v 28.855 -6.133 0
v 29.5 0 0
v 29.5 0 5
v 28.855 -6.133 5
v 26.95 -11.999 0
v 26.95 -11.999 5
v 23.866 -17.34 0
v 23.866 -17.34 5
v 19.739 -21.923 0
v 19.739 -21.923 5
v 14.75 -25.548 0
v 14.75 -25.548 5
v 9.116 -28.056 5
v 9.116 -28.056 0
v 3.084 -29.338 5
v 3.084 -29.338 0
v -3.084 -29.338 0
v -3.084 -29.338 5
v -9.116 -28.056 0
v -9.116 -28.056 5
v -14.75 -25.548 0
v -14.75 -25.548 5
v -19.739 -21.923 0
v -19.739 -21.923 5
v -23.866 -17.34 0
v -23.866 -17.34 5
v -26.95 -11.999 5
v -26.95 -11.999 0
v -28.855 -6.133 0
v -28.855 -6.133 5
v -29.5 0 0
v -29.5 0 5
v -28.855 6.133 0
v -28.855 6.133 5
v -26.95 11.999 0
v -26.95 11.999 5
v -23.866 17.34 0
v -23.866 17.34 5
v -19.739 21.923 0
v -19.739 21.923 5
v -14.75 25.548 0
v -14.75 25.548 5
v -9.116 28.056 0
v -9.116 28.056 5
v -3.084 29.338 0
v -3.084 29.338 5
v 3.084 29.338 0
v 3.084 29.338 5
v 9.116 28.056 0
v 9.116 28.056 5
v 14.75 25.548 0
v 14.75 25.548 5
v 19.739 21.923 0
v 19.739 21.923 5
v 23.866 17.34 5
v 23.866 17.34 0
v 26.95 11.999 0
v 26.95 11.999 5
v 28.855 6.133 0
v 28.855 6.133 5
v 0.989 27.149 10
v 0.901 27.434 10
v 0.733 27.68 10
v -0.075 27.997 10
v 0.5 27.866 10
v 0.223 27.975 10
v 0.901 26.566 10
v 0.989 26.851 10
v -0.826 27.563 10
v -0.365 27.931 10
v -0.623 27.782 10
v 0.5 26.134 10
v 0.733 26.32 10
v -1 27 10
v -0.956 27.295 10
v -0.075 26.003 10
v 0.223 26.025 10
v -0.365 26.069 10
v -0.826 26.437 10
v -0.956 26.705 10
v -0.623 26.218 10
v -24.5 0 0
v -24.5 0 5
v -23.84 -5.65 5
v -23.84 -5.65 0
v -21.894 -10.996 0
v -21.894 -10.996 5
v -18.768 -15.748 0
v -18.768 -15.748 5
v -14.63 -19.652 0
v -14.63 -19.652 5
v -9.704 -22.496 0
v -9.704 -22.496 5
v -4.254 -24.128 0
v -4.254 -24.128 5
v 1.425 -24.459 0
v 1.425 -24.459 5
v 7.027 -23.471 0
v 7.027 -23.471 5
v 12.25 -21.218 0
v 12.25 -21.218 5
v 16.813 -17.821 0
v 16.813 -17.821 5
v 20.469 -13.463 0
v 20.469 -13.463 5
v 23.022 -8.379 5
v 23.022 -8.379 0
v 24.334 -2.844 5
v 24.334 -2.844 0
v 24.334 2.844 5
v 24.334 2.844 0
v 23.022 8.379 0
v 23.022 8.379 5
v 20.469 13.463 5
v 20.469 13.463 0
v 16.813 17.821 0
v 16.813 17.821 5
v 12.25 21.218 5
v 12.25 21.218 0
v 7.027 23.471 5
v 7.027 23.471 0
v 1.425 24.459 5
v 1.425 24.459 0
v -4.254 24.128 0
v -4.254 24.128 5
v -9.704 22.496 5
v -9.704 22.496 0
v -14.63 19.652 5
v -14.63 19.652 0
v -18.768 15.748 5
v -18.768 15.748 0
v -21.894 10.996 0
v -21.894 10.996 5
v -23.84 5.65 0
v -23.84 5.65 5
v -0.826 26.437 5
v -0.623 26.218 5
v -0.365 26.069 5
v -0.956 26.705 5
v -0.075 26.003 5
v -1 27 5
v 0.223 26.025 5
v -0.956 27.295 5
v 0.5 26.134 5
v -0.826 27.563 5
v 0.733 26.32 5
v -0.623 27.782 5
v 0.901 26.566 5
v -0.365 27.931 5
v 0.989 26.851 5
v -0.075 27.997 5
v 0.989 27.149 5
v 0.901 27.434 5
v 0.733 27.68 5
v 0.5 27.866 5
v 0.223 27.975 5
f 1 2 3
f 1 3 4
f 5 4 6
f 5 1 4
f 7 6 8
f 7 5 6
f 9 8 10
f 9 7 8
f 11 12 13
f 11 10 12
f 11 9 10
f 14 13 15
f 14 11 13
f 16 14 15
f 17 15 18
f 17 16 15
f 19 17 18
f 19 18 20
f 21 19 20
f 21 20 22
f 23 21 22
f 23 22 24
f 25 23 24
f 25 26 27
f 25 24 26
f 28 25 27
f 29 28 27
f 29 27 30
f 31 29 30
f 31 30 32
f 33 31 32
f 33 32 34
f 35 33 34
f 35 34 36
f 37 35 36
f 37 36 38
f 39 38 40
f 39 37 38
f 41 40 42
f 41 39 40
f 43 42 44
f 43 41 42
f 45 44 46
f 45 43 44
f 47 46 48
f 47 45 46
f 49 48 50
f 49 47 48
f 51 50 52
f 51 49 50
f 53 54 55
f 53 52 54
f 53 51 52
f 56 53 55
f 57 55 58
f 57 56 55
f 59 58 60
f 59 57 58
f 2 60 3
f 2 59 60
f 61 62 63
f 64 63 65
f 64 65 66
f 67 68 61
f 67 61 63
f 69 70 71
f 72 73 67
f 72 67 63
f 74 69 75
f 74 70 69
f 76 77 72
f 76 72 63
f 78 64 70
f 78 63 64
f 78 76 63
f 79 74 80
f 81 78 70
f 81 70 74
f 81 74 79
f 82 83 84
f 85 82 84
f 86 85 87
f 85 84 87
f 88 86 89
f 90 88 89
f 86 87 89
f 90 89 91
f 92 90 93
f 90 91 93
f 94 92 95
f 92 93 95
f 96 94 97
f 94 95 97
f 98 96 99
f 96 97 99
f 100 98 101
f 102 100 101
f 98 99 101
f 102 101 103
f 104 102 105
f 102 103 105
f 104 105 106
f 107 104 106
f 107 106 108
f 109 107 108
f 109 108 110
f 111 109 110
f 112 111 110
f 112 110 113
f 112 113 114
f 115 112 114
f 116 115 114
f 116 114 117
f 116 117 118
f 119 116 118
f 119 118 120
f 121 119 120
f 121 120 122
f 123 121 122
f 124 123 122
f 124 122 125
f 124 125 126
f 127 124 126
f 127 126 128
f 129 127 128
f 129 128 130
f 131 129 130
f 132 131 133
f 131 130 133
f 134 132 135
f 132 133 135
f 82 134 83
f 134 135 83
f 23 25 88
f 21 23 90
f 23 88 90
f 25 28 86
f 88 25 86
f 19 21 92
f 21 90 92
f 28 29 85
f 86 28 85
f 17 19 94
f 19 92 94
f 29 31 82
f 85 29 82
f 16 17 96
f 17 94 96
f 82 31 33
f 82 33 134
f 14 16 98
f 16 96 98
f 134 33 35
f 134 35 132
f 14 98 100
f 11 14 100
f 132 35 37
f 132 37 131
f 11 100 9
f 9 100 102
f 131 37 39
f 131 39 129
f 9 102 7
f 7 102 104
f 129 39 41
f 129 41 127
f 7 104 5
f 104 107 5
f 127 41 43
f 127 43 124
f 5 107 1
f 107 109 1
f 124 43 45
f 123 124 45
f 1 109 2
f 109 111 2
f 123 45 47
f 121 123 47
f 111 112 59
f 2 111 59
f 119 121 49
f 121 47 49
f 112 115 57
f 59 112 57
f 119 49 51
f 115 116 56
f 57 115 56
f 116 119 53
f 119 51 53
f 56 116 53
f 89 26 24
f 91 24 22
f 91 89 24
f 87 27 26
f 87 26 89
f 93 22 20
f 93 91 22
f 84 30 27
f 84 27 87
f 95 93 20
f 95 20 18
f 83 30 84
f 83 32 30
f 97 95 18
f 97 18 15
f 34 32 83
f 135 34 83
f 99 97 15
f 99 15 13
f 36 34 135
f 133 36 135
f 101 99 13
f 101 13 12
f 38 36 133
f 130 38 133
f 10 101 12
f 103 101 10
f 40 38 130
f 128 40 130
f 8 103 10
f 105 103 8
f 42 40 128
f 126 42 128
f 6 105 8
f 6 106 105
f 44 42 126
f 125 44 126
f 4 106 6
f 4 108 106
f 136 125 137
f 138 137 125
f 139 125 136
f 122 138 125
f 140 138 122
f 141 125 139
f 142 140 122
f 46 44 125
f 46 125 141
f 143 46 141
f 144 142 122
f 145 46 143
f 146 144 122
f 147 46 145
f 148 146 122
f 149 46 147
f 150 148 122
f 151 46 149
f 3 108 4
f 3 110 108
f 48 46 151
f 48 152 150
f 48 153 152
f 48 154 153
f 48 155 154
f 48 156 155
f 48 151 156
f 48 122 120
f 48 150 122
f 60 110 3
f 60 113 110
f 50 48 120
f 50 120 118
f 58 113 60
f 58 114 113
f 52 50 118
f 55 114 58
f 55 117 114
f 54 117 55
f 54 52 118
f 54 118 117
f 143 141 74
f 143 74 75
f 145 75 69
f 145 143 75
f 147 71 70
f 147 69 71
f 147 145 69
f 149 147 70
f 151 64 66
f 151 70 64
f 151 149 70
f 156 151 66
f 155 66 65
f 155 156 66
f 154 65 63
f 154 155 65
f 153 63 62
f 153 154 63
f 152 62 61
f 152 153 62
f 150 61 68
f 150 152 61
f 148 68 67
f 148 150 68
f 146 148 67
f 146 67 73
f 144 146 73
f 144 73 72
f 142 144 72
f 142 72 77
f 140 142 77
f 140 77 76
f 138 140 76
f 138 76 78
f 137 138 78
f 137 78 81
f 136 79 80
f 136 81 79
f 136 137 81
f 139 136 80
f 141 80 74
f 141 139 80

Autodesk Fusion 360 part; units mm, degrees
sketch "Sketch1" plane through (0, 0, 0) normal (0, 0, 1) x (1, 0, 0)
  circle A0 centre (0, 0) radius 29.5
  dimension "d1" = 59
sketch "Sketch2" plane through (0, 0, 0) normal (0, 0, 1) x (1, 0, 0)
  circle A0 centre (0, 0) radius 22.5
  dimension "d2" = 45
extrude "Extrude1" add sketch "Sketch1" sketch "Sketch2" along normal blind 5 of sketch 2
sketch "Sketch3" plane through (0, 0, 5) normal (0, 0, 1) x (-1, 0, 0)
  circle A0 centre (0, 0) radius 29.5
  circle A1 centre (0, 0) radius 24.5
  dimension "d5" = 49
extrude "Extrude2" cut sketch "Sketch3" against normal blind 115 contours A1
sketch "Sketch4" plane through (0, 0, 0) normal (0, 0, 1) x (1, 0, 0)
sketch "Sketch5" plane through (0, 0, 5) normal (0, 0, 1) x (-1, 0, 0)
  circle A0 centre (0, 0) radius 24.5
  circle A1 centre (0, 0) radius 29.5
  circle A2 centre (0, -27) radius 1
extrude "Extrude3" add sketch "Sketch5" along normal blind 5 contours A2
sketch "Sketch6" plane through (0, 0, 0) normal (0, 0, 1) x (1, 0, 0)
